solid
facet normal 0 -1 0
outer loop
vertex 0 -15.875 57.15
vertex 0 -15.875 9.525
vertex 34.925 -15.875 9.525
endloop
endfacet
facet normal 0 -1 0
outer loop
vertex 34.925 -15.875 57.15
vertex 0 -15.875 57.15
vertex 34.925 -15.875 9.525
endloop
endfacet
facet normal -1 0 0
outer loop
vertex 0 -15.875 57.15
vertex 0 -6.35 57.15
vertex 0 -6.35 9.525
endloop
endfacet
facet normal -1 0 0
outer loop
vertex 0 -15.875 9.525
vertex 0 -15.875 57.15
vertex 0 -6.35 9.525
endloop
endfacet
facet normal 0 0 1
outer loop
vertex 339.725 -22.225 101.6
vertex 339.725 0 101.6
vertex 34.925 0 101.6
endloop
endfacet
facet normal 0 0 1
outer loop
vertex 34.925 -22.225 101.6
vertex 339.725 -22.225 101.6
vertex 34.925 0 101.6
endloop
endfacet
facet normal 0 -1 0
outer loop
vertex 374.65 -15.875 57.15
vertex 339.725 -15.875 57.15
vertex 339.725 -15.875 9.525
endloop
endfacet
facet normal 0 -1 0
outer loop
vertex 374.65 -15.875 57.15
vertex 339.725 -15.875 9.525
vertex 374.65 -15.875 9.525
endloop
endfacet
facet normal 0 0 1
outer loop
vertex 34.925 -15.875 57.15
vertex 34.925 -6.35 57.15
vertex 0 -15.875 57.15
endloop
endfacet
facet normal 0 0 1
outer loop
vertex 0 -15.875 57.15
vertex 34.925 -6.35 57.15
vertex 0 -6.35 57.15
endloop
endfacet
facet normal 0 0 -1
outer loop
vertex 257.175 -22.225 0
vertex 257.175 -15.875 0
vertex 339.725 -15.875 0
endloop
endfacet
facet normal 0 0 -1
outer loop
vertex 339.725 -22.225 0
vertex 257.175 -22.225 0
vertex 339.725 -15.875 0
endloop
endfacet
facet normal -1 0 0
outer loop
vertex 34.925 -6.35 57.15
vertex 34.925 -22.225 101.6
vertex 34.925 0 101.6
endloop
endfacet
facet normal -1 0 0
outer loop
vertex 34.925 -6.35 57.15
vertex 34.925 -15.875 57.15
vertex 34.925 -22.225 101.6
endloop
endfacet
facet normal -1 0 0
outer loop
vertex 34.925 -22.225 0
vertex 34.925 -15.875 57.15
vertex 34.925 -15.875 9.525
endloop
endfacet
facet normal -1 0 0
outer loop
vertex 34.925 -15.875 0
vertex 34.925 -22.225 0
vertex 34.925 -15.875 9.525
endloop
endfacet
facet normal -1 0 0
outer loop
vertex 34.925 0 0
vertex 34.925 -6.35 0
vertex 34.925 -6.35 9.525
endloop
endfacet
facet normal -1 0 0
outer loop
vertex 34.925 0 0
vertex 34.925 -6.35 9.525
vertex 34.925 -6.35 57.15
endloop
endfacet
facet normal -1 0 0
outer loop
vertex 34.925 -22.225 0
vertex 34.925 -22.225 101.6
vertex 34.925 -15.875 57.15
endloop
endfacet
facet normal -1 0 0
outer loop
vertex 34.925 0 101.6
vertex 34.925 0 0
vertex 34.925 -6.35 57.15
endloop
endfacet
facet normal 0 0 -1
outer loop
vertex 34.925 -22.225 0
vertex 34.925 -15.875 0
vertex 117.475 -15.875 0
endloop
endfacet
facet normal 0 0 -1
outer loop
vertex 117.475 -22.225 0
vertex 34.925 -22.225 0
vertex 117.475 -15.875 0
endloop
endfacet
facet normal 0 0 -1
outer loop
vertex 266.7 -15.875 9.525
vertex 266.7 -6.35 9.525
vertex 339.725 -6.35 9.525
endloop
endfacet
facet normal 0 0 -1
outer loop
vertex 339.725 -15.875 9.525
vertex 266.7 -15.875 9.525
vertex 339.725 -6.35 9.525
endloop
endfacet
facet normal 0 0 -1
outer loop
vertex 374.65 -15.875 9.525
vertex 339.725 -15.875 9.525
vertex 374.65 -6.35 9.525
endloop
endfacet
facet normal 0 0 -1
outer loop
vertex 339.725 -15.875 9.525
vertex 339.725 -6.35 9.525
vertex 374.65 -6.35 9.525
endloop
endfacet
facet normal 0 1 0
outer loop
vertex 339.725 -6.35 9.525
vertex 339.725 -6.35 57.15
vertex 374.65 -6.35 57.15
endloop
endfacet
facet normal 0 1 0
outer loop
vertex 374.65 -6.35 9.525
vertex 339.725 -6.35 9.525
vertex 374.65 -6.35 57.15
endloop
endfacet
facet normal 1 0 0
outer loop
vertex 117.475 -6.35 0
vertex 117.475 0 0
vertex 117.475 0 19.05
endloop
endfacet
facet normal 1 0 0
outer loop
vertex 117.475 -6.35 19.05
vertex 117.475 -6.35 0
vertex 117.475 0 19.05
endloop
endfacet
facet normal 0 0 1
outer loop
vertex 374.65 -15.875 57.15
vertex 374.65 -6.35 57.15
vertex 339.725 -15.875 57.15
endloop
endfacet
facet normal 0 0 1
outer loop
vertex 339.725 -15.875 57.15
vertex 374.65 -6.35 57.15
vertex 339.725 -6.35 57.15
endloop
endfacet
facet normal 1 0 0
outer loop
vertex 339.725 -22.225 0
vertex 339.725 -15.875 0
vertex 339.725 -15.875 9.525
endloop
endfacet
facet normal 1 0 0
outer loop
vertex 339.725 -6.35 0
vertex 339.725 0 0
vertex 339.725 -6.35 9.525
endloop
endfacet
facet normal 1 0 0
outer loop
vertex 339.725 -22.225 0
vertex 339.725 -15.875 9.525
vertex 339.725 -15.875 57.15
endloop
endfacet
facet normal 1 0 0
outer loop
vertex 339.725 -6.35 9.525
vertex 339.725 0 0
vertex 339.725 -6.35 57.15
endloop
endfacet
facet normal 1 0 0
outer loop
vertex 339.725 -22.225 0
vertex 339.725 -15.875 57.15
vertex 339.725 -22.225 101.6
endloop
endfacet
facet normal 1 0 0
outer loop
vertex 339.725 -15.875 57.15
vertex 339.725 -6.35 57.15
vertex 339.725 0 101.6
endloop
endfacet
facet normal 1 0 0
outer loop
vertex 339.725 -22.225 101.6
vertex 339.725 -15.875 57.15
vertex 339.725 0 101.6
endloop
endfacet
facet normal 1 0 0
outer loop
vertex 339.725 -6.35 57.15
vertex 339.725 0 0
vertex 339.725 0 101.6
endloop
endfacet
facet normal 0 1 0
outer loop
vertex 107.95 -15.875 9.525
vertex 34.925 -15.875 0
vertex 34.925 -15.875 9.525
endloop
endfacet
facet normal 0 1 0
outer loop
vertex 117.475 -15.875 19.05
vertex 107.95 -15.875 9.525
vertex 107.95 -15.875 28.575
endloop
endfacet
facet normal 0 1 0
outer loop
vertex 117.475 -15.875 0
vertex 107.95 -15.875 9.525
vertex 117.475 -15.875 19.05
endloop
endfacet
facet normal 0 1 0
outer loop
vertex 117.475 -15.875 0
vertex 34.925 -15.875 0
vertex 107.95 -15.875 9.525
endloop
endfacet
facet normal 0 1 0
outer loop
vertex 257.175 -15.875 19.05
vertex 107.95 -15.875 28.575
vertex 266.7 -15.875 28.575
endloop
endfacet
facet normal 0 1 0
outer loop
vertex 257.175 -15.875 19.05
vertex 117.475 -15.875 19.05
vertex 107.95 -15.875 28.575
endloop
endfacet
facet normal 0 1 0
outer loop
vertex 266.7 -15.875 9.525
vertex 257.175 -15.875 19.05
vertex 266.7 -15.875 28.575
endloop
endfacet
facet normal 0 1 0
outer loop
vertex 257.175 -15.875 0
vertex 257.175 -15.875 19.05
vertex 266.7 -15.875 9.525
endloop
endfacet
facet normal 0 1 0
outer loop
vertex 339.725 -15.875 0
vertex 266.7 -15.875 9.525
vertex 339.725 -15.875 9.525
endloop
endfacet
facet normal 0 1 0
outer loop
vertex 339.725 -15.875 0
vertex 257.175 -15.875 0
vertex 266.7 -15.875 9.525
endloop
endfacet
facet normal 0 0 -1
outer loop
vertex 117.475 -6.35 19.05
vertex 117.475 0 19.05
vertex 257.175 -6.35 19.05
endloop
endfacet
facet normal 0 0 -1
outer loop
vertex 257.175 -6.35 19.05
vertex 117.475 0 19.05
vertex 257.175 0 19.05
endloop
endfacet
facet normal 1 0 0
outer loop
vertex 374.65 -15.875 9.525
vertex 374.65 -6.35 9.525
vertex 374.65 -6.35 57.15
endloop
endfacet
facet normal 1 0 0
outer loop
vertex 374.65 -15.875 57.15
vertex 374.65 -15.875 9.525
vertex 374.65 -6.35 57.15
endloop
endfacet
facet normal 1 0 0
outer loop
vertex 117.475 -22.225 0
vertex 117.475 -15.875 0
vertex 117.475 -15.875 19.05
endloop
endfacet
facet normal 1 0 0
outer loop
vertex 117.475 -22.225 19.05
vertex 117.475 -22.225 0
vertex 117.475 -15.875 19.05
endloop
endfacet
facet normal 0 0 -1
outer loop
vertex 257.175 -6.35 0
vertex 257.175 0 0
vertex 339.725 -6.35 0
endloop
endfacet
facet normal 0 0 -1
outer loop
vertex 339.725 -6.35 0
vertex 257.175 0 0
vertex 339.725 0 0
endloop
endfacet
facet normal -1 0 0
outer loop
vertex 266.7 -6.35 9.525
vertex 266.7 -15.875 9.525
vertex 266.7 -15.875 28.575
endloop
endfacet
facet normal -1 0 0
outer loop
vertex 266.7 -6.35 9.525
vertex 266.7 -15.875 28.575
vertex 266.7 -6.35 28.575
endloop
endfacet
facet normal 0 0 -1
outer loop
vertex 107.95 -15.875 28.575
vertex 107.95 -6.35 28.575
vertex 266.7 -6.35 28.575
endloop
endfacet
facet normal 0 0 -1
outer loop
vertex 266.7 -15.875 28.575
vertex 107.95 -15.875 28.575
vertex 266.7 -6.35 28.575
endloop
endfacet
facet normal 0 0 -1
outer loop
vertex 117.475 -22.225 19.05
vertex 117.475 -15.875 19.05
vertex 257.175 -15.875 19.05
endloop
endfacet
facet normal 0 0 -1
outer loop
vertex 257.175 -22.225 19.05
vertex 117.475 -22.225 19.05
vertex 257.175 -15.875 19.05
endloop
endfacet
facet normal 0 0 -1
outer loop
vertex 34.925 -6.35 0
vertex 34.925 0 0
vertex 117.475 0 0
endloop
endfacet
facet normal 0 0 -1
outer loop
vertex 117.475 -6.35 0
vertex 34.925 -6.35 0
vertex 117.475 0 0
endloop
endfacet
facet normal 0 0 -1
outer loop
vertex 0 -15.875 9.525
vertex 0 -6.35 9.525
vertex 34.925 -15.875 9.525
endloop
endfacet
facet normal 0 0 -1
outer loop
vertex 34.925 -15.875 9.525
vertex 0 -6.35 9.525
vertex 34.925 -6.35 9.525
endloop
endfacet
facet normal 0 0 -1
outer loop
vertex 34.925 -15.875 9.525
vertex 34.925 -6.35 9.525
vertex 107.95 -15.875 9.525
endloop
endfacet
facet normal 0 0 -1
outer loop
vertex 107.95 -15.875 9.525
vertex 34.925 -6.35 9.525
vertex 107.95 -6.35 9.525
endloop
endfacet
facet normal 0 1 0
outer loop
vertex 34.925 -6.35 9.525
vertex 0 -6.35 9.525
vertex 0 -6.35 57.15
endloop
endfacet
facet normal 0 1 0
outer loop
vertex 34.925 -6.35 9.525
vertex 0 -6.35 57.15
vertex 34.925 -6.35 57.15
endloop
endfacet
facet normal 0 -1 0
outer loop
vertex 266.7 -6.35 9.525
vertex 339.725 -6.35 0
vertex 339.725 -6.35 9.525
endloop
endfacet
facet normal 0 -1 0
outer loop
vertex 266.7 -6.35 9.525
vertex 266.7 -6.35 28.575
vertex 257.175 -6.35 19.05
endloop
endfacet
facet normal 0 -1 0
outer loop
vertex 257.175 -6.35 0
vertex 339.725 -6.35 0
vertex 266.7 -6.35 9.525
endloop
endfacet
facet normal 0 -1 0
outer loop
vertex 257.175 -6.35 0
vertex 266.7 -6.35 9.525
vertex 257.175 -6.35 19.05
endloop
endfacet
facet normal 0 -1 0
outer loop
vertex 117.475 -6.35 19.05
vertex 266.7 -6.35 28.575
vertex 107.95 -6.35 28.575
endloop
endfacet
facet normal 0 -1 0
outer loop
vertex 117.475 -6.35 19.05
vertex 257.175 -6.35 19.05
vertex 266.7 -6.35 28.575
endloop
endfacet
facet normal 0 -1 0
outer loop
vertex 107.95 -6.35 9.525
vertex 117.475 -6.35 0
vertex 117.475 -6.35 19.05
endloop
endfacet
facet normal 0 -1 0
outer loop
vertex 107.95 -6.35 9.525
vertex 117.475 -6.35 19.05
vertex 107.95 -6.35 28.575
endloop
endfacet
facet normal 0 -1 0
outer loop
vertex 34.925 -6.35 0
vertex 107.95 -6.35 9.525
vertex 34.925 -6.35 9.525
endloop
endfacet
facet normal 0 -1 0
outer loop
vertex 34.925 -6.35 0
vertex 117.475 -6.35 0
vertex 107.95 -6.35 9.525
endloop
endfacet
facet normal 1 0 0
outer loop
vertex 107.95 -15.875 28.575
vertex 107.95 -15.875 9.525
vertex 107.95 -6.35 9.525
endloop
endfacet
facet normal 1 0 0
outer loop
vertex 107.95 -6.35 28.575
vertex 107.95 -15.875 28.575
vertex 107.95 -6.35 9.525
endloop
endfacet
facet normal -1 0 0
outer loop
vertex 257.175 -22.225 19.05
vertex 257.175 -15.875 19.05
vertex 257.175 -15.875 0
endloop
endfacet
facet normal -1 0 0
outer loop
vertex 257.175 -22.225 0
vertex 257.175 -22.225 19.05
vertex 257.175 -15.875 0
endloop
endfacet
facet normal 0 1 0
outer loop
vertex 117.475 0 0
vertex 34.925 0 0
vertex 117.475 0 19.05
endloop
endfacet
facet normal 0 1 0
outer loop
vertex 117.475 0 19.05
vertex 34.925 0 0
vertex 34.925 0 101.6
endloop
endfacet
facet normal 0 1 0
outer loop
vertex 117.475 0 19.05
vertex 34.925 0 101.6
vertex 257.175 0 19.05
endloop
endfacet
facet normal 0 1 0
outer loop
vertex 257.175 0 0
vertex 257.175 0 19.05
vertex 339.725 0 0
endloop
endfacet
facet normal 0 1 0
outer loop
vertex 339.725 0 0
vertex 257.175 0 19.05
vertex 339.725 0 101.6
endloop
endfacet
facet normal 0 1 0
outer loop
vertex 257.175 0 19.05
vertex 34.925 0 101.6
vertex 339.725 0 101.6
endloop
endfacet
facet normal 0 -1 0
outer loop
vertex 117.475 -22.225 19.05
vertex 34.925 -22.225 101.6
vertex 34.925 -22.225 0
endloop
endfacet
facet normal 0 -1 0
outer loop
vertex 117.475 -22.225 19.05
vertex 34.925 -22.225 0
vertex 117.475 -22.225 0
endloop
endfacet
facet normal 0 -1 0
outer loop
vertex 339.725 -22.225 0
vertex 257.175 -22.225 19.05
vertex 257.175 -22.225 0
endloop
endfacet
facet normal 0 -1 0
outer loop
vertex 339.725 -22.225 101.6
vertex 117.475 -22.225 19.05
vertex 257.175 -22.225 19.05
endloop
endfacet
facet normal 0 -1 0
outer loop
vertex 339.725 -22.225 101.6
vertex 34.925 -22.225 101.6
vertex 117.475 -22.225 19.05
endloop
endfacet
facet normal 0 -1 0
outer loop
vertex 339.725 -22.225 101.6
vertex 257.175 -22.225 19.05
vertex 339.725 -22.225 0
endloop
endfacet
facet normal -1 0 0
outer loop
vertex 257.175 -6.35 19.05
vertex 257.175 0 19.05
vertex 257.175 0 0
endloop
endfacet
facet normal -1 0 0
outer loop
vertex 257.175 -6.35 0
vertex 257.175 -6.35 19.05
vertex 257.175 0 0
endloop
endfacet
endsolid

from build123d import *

# Parameters (mm, degrees)
F1_DEPTH = 22.225
F2_W     = 34.925
F2_H     = 6.35
F3_DEPTH = 57.15
F2_H_2   = 9.525
F2_W_2   = 73.025
F2_W_3   = 158.75
F4_DEPTH = 9.525
F5_DEPTH = 28.575


with BuildPart() as f1:
    # F0 (on Front) → F1 (new body)
    with BuildSketch(Plane.XZ):
        Polygon((0, 57.15), (0, 0), (117.475, 0), (117.475, 19.05), (257.175, 19.05), (257.175, 0), (374.65, 0), (374.65, 57.15), (339.725, 57.15), (339.725, 101.6), (34.925, 101.6), (34.925, 57.15), align=None)
    extrude(amount=F1_DEPTH)

    # F2 (on Top) → F3 (cut, through all)
    with BuildSketch(Plane.XY):
        with Locations((357.1875, -19.05)):
            Rectangle(F2_W, F2_H)
        with Locations((357.1875, -3.175)):
            Rectangle(F2_W, F2_H)
        with Locations((17.4625, -19.05)):
            Rectangle(F2_W, F2_H)
        with Locations((17.4625, -3.175)):
            Rectangle(F2_W, F2_H)
    extrude(amount=F3_DEPTH, mode=Mode.SUBTRACT)

    # F2 (on Top) → F4 (cut)
    with BuildSketch(Plane.XY):
        with Locations((17.4625, -11.1125)):
            Rectangle(F2_W, F2_H_2)
        with Locations((71.4375, -11.1125)):
            Rectangle(F2_W_2, F2_H_2)
        with Locations((357.1875, -11.1125)):
            Rectangle(F2_W, F2_H_2)
        with Locations((303.2125, -11.1125)):
            Rectangle(F2_W_2, F2_H_2)
        with Locations((187.325, -11.1125)):
            Rectangle(F2_W_3, F2_H_2)
    extrude(amount=F4_DEPTH, mode=Mode.SUBTRACT)

    # F2 (on Top) → F5 (cut)
    with BuildSketch(Plane.XY):
        with Locations((187.325, -11.1125)):
            Rectangle(F2_W_3, F2_H_2)
    extrude(amount=F5_DEPTH, mode=Mode.SUBTRACT)


solid = f1.part
